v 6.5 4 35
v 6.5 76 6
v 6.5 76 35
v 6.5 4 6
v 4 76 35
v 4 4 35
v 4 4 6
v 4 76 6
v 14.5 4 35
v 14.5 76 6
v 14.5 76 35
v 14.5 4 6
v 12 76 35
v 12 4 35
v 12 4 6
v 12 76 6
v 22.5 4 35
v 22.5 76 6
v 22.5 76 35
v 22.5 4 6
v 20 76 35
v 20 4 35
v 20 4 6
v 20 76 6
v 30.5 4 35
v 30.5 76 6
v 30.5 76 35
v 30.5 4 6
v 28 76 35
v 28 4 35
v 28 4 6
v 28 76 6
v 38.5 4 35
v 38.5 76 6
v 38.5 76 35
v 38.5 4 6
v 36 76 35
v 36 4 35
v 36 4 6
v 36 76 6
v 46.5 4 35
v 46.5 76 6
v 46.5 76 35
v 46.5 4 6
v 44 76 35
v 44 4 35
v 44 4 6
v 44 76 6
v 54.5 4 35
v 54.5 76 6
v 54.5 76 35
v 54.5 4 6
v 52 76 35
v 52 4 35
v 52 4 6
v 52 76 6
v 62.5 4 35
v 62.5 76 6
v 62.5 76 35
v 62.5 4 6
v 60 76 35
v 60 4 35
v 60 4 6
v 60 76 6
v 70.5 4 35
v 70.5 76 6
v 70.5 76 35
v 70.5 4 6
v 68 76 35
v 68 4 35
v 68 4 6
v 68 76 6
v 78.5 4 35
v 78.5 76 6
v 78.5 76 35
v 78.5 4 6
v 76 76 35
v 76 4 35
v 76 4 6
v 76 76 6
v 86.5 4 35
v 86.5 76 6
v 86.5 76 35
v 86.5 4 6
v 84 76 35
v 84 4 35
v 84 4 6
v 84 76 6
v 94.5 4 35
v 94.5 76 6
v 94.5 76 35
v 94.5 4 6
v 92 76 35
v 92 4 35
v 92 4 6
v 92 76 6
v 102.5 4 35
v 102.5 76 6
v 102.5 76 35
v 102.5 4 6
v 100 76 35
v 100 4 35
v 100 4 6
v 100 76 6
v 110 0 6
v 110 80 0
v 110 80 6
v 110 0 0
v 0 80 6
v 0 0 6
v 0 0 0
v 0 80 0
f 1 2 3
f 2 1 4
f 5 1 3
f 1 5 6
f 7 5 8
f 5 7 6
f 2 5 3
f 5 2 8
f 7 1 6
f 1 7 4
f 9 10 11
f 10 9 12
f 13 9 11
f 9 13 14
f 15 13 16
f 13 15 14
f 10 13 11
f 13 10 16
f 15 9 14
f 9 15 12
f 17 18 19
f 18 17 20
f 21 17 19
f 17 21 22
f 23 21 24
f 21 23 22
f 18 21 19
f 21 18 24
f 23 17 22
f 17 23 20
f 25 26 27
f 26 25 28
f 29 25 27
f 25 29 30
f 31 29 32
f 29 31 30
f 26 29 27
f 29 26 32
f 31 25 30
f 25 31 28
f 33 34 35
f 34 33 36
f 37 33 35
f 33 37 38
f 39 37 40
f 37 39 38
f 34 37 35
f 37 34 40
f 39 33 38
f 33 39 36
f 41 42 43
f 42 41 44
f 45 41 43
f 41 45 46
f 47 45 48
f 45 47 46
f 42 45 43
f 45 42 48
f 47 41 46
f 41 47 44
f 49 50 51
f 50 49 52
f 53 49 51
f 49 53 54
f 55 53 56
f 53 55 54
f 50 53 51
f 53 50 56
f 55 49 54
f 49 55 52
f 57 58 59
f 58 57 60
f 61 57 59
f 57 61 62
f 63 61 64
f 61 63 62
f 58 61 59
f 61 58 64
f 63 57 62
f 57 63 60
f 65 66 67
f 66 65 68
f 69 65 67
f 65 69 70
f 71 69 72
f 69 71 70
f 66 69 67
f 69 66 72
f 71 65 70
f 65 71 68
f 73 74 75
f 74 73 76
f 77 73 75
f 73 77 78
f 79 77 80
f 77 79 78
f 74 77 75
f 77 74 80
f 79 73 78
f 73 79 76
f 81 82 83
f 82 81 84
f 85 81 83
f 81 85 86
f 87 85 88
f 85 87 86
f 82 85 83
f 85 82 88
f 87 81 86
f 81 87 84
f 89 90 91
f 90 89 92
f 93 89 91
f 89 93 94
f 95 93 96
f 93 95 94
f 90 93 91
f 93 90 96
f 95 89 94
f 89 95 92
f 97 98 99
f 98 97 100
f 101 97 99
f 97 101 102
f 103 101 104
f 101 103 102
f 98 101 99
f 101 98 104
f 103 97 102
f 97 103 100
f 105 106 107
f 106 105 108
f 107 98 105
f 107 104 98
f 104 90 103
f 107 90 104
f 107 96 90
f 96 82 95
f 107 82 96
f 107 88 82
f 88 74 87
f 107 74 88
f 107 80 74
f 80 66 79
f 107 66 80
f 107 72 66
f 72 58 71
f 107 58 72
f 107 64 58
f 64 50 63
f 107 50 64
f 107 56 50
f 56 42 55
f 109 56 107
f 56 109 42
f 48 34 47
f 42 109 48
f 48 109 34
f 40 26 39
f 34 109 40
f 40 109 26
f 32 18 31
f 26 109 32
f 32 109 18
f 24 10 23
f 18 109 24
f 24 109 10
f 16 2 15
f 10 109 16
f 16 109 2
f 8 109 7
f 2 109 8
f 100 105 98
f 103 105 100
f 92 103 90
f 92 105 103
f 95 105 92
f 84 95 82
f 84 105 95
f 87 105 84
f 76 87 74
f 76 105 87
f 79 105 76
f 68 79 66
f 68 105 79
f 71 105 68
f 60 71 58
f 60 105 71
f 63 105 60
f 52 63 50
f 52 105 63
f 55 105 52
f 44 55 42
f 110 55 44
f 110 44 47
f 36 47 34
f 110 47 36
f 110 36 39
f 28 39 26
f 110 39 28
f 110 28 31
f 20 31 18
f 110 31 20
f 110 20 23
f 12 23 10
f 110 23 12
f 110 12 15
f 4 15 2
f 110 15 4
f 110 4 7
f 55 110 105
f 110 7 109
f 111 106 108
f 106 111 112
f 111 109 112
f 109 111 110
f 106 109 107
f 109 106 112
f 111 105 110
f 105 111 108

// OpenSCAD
$fn = 32;

// ----------------------------------------------------------------------
// Heatsink: uniform fin block
// ----------------------------------------------------------------------

// --- parameters (mm) ---
base_l = 110;             // base length, X
base_w = 80;              // base width, Y
base_t = 6;               // base plate thickness
fin_h = 30;               // fin height above the base
fin_t = 2.5;              // fin thickness
edge = 4;                 // margin from the base ends
pitch = 8;                // fin pitch
fit_tol = 0.1;            // tolerance for press fits, mm
free_tol = 0.5;           // tolerance for clearance fits, mm

n_fins = floor((base_l - 2 * edge - fin_t) / pitch) + 1;  // fin count
total_h = base_t + fin_h - 1;  // overall height

union() {
  cube([base_l, base_w, base_t]);
  for (i = [0 : n_fins - 1])
    translate([edge + i * pitch, edge, base_t - 1])
      cube([fin_t, base_w - 2 * edge, fin_h]);
}
